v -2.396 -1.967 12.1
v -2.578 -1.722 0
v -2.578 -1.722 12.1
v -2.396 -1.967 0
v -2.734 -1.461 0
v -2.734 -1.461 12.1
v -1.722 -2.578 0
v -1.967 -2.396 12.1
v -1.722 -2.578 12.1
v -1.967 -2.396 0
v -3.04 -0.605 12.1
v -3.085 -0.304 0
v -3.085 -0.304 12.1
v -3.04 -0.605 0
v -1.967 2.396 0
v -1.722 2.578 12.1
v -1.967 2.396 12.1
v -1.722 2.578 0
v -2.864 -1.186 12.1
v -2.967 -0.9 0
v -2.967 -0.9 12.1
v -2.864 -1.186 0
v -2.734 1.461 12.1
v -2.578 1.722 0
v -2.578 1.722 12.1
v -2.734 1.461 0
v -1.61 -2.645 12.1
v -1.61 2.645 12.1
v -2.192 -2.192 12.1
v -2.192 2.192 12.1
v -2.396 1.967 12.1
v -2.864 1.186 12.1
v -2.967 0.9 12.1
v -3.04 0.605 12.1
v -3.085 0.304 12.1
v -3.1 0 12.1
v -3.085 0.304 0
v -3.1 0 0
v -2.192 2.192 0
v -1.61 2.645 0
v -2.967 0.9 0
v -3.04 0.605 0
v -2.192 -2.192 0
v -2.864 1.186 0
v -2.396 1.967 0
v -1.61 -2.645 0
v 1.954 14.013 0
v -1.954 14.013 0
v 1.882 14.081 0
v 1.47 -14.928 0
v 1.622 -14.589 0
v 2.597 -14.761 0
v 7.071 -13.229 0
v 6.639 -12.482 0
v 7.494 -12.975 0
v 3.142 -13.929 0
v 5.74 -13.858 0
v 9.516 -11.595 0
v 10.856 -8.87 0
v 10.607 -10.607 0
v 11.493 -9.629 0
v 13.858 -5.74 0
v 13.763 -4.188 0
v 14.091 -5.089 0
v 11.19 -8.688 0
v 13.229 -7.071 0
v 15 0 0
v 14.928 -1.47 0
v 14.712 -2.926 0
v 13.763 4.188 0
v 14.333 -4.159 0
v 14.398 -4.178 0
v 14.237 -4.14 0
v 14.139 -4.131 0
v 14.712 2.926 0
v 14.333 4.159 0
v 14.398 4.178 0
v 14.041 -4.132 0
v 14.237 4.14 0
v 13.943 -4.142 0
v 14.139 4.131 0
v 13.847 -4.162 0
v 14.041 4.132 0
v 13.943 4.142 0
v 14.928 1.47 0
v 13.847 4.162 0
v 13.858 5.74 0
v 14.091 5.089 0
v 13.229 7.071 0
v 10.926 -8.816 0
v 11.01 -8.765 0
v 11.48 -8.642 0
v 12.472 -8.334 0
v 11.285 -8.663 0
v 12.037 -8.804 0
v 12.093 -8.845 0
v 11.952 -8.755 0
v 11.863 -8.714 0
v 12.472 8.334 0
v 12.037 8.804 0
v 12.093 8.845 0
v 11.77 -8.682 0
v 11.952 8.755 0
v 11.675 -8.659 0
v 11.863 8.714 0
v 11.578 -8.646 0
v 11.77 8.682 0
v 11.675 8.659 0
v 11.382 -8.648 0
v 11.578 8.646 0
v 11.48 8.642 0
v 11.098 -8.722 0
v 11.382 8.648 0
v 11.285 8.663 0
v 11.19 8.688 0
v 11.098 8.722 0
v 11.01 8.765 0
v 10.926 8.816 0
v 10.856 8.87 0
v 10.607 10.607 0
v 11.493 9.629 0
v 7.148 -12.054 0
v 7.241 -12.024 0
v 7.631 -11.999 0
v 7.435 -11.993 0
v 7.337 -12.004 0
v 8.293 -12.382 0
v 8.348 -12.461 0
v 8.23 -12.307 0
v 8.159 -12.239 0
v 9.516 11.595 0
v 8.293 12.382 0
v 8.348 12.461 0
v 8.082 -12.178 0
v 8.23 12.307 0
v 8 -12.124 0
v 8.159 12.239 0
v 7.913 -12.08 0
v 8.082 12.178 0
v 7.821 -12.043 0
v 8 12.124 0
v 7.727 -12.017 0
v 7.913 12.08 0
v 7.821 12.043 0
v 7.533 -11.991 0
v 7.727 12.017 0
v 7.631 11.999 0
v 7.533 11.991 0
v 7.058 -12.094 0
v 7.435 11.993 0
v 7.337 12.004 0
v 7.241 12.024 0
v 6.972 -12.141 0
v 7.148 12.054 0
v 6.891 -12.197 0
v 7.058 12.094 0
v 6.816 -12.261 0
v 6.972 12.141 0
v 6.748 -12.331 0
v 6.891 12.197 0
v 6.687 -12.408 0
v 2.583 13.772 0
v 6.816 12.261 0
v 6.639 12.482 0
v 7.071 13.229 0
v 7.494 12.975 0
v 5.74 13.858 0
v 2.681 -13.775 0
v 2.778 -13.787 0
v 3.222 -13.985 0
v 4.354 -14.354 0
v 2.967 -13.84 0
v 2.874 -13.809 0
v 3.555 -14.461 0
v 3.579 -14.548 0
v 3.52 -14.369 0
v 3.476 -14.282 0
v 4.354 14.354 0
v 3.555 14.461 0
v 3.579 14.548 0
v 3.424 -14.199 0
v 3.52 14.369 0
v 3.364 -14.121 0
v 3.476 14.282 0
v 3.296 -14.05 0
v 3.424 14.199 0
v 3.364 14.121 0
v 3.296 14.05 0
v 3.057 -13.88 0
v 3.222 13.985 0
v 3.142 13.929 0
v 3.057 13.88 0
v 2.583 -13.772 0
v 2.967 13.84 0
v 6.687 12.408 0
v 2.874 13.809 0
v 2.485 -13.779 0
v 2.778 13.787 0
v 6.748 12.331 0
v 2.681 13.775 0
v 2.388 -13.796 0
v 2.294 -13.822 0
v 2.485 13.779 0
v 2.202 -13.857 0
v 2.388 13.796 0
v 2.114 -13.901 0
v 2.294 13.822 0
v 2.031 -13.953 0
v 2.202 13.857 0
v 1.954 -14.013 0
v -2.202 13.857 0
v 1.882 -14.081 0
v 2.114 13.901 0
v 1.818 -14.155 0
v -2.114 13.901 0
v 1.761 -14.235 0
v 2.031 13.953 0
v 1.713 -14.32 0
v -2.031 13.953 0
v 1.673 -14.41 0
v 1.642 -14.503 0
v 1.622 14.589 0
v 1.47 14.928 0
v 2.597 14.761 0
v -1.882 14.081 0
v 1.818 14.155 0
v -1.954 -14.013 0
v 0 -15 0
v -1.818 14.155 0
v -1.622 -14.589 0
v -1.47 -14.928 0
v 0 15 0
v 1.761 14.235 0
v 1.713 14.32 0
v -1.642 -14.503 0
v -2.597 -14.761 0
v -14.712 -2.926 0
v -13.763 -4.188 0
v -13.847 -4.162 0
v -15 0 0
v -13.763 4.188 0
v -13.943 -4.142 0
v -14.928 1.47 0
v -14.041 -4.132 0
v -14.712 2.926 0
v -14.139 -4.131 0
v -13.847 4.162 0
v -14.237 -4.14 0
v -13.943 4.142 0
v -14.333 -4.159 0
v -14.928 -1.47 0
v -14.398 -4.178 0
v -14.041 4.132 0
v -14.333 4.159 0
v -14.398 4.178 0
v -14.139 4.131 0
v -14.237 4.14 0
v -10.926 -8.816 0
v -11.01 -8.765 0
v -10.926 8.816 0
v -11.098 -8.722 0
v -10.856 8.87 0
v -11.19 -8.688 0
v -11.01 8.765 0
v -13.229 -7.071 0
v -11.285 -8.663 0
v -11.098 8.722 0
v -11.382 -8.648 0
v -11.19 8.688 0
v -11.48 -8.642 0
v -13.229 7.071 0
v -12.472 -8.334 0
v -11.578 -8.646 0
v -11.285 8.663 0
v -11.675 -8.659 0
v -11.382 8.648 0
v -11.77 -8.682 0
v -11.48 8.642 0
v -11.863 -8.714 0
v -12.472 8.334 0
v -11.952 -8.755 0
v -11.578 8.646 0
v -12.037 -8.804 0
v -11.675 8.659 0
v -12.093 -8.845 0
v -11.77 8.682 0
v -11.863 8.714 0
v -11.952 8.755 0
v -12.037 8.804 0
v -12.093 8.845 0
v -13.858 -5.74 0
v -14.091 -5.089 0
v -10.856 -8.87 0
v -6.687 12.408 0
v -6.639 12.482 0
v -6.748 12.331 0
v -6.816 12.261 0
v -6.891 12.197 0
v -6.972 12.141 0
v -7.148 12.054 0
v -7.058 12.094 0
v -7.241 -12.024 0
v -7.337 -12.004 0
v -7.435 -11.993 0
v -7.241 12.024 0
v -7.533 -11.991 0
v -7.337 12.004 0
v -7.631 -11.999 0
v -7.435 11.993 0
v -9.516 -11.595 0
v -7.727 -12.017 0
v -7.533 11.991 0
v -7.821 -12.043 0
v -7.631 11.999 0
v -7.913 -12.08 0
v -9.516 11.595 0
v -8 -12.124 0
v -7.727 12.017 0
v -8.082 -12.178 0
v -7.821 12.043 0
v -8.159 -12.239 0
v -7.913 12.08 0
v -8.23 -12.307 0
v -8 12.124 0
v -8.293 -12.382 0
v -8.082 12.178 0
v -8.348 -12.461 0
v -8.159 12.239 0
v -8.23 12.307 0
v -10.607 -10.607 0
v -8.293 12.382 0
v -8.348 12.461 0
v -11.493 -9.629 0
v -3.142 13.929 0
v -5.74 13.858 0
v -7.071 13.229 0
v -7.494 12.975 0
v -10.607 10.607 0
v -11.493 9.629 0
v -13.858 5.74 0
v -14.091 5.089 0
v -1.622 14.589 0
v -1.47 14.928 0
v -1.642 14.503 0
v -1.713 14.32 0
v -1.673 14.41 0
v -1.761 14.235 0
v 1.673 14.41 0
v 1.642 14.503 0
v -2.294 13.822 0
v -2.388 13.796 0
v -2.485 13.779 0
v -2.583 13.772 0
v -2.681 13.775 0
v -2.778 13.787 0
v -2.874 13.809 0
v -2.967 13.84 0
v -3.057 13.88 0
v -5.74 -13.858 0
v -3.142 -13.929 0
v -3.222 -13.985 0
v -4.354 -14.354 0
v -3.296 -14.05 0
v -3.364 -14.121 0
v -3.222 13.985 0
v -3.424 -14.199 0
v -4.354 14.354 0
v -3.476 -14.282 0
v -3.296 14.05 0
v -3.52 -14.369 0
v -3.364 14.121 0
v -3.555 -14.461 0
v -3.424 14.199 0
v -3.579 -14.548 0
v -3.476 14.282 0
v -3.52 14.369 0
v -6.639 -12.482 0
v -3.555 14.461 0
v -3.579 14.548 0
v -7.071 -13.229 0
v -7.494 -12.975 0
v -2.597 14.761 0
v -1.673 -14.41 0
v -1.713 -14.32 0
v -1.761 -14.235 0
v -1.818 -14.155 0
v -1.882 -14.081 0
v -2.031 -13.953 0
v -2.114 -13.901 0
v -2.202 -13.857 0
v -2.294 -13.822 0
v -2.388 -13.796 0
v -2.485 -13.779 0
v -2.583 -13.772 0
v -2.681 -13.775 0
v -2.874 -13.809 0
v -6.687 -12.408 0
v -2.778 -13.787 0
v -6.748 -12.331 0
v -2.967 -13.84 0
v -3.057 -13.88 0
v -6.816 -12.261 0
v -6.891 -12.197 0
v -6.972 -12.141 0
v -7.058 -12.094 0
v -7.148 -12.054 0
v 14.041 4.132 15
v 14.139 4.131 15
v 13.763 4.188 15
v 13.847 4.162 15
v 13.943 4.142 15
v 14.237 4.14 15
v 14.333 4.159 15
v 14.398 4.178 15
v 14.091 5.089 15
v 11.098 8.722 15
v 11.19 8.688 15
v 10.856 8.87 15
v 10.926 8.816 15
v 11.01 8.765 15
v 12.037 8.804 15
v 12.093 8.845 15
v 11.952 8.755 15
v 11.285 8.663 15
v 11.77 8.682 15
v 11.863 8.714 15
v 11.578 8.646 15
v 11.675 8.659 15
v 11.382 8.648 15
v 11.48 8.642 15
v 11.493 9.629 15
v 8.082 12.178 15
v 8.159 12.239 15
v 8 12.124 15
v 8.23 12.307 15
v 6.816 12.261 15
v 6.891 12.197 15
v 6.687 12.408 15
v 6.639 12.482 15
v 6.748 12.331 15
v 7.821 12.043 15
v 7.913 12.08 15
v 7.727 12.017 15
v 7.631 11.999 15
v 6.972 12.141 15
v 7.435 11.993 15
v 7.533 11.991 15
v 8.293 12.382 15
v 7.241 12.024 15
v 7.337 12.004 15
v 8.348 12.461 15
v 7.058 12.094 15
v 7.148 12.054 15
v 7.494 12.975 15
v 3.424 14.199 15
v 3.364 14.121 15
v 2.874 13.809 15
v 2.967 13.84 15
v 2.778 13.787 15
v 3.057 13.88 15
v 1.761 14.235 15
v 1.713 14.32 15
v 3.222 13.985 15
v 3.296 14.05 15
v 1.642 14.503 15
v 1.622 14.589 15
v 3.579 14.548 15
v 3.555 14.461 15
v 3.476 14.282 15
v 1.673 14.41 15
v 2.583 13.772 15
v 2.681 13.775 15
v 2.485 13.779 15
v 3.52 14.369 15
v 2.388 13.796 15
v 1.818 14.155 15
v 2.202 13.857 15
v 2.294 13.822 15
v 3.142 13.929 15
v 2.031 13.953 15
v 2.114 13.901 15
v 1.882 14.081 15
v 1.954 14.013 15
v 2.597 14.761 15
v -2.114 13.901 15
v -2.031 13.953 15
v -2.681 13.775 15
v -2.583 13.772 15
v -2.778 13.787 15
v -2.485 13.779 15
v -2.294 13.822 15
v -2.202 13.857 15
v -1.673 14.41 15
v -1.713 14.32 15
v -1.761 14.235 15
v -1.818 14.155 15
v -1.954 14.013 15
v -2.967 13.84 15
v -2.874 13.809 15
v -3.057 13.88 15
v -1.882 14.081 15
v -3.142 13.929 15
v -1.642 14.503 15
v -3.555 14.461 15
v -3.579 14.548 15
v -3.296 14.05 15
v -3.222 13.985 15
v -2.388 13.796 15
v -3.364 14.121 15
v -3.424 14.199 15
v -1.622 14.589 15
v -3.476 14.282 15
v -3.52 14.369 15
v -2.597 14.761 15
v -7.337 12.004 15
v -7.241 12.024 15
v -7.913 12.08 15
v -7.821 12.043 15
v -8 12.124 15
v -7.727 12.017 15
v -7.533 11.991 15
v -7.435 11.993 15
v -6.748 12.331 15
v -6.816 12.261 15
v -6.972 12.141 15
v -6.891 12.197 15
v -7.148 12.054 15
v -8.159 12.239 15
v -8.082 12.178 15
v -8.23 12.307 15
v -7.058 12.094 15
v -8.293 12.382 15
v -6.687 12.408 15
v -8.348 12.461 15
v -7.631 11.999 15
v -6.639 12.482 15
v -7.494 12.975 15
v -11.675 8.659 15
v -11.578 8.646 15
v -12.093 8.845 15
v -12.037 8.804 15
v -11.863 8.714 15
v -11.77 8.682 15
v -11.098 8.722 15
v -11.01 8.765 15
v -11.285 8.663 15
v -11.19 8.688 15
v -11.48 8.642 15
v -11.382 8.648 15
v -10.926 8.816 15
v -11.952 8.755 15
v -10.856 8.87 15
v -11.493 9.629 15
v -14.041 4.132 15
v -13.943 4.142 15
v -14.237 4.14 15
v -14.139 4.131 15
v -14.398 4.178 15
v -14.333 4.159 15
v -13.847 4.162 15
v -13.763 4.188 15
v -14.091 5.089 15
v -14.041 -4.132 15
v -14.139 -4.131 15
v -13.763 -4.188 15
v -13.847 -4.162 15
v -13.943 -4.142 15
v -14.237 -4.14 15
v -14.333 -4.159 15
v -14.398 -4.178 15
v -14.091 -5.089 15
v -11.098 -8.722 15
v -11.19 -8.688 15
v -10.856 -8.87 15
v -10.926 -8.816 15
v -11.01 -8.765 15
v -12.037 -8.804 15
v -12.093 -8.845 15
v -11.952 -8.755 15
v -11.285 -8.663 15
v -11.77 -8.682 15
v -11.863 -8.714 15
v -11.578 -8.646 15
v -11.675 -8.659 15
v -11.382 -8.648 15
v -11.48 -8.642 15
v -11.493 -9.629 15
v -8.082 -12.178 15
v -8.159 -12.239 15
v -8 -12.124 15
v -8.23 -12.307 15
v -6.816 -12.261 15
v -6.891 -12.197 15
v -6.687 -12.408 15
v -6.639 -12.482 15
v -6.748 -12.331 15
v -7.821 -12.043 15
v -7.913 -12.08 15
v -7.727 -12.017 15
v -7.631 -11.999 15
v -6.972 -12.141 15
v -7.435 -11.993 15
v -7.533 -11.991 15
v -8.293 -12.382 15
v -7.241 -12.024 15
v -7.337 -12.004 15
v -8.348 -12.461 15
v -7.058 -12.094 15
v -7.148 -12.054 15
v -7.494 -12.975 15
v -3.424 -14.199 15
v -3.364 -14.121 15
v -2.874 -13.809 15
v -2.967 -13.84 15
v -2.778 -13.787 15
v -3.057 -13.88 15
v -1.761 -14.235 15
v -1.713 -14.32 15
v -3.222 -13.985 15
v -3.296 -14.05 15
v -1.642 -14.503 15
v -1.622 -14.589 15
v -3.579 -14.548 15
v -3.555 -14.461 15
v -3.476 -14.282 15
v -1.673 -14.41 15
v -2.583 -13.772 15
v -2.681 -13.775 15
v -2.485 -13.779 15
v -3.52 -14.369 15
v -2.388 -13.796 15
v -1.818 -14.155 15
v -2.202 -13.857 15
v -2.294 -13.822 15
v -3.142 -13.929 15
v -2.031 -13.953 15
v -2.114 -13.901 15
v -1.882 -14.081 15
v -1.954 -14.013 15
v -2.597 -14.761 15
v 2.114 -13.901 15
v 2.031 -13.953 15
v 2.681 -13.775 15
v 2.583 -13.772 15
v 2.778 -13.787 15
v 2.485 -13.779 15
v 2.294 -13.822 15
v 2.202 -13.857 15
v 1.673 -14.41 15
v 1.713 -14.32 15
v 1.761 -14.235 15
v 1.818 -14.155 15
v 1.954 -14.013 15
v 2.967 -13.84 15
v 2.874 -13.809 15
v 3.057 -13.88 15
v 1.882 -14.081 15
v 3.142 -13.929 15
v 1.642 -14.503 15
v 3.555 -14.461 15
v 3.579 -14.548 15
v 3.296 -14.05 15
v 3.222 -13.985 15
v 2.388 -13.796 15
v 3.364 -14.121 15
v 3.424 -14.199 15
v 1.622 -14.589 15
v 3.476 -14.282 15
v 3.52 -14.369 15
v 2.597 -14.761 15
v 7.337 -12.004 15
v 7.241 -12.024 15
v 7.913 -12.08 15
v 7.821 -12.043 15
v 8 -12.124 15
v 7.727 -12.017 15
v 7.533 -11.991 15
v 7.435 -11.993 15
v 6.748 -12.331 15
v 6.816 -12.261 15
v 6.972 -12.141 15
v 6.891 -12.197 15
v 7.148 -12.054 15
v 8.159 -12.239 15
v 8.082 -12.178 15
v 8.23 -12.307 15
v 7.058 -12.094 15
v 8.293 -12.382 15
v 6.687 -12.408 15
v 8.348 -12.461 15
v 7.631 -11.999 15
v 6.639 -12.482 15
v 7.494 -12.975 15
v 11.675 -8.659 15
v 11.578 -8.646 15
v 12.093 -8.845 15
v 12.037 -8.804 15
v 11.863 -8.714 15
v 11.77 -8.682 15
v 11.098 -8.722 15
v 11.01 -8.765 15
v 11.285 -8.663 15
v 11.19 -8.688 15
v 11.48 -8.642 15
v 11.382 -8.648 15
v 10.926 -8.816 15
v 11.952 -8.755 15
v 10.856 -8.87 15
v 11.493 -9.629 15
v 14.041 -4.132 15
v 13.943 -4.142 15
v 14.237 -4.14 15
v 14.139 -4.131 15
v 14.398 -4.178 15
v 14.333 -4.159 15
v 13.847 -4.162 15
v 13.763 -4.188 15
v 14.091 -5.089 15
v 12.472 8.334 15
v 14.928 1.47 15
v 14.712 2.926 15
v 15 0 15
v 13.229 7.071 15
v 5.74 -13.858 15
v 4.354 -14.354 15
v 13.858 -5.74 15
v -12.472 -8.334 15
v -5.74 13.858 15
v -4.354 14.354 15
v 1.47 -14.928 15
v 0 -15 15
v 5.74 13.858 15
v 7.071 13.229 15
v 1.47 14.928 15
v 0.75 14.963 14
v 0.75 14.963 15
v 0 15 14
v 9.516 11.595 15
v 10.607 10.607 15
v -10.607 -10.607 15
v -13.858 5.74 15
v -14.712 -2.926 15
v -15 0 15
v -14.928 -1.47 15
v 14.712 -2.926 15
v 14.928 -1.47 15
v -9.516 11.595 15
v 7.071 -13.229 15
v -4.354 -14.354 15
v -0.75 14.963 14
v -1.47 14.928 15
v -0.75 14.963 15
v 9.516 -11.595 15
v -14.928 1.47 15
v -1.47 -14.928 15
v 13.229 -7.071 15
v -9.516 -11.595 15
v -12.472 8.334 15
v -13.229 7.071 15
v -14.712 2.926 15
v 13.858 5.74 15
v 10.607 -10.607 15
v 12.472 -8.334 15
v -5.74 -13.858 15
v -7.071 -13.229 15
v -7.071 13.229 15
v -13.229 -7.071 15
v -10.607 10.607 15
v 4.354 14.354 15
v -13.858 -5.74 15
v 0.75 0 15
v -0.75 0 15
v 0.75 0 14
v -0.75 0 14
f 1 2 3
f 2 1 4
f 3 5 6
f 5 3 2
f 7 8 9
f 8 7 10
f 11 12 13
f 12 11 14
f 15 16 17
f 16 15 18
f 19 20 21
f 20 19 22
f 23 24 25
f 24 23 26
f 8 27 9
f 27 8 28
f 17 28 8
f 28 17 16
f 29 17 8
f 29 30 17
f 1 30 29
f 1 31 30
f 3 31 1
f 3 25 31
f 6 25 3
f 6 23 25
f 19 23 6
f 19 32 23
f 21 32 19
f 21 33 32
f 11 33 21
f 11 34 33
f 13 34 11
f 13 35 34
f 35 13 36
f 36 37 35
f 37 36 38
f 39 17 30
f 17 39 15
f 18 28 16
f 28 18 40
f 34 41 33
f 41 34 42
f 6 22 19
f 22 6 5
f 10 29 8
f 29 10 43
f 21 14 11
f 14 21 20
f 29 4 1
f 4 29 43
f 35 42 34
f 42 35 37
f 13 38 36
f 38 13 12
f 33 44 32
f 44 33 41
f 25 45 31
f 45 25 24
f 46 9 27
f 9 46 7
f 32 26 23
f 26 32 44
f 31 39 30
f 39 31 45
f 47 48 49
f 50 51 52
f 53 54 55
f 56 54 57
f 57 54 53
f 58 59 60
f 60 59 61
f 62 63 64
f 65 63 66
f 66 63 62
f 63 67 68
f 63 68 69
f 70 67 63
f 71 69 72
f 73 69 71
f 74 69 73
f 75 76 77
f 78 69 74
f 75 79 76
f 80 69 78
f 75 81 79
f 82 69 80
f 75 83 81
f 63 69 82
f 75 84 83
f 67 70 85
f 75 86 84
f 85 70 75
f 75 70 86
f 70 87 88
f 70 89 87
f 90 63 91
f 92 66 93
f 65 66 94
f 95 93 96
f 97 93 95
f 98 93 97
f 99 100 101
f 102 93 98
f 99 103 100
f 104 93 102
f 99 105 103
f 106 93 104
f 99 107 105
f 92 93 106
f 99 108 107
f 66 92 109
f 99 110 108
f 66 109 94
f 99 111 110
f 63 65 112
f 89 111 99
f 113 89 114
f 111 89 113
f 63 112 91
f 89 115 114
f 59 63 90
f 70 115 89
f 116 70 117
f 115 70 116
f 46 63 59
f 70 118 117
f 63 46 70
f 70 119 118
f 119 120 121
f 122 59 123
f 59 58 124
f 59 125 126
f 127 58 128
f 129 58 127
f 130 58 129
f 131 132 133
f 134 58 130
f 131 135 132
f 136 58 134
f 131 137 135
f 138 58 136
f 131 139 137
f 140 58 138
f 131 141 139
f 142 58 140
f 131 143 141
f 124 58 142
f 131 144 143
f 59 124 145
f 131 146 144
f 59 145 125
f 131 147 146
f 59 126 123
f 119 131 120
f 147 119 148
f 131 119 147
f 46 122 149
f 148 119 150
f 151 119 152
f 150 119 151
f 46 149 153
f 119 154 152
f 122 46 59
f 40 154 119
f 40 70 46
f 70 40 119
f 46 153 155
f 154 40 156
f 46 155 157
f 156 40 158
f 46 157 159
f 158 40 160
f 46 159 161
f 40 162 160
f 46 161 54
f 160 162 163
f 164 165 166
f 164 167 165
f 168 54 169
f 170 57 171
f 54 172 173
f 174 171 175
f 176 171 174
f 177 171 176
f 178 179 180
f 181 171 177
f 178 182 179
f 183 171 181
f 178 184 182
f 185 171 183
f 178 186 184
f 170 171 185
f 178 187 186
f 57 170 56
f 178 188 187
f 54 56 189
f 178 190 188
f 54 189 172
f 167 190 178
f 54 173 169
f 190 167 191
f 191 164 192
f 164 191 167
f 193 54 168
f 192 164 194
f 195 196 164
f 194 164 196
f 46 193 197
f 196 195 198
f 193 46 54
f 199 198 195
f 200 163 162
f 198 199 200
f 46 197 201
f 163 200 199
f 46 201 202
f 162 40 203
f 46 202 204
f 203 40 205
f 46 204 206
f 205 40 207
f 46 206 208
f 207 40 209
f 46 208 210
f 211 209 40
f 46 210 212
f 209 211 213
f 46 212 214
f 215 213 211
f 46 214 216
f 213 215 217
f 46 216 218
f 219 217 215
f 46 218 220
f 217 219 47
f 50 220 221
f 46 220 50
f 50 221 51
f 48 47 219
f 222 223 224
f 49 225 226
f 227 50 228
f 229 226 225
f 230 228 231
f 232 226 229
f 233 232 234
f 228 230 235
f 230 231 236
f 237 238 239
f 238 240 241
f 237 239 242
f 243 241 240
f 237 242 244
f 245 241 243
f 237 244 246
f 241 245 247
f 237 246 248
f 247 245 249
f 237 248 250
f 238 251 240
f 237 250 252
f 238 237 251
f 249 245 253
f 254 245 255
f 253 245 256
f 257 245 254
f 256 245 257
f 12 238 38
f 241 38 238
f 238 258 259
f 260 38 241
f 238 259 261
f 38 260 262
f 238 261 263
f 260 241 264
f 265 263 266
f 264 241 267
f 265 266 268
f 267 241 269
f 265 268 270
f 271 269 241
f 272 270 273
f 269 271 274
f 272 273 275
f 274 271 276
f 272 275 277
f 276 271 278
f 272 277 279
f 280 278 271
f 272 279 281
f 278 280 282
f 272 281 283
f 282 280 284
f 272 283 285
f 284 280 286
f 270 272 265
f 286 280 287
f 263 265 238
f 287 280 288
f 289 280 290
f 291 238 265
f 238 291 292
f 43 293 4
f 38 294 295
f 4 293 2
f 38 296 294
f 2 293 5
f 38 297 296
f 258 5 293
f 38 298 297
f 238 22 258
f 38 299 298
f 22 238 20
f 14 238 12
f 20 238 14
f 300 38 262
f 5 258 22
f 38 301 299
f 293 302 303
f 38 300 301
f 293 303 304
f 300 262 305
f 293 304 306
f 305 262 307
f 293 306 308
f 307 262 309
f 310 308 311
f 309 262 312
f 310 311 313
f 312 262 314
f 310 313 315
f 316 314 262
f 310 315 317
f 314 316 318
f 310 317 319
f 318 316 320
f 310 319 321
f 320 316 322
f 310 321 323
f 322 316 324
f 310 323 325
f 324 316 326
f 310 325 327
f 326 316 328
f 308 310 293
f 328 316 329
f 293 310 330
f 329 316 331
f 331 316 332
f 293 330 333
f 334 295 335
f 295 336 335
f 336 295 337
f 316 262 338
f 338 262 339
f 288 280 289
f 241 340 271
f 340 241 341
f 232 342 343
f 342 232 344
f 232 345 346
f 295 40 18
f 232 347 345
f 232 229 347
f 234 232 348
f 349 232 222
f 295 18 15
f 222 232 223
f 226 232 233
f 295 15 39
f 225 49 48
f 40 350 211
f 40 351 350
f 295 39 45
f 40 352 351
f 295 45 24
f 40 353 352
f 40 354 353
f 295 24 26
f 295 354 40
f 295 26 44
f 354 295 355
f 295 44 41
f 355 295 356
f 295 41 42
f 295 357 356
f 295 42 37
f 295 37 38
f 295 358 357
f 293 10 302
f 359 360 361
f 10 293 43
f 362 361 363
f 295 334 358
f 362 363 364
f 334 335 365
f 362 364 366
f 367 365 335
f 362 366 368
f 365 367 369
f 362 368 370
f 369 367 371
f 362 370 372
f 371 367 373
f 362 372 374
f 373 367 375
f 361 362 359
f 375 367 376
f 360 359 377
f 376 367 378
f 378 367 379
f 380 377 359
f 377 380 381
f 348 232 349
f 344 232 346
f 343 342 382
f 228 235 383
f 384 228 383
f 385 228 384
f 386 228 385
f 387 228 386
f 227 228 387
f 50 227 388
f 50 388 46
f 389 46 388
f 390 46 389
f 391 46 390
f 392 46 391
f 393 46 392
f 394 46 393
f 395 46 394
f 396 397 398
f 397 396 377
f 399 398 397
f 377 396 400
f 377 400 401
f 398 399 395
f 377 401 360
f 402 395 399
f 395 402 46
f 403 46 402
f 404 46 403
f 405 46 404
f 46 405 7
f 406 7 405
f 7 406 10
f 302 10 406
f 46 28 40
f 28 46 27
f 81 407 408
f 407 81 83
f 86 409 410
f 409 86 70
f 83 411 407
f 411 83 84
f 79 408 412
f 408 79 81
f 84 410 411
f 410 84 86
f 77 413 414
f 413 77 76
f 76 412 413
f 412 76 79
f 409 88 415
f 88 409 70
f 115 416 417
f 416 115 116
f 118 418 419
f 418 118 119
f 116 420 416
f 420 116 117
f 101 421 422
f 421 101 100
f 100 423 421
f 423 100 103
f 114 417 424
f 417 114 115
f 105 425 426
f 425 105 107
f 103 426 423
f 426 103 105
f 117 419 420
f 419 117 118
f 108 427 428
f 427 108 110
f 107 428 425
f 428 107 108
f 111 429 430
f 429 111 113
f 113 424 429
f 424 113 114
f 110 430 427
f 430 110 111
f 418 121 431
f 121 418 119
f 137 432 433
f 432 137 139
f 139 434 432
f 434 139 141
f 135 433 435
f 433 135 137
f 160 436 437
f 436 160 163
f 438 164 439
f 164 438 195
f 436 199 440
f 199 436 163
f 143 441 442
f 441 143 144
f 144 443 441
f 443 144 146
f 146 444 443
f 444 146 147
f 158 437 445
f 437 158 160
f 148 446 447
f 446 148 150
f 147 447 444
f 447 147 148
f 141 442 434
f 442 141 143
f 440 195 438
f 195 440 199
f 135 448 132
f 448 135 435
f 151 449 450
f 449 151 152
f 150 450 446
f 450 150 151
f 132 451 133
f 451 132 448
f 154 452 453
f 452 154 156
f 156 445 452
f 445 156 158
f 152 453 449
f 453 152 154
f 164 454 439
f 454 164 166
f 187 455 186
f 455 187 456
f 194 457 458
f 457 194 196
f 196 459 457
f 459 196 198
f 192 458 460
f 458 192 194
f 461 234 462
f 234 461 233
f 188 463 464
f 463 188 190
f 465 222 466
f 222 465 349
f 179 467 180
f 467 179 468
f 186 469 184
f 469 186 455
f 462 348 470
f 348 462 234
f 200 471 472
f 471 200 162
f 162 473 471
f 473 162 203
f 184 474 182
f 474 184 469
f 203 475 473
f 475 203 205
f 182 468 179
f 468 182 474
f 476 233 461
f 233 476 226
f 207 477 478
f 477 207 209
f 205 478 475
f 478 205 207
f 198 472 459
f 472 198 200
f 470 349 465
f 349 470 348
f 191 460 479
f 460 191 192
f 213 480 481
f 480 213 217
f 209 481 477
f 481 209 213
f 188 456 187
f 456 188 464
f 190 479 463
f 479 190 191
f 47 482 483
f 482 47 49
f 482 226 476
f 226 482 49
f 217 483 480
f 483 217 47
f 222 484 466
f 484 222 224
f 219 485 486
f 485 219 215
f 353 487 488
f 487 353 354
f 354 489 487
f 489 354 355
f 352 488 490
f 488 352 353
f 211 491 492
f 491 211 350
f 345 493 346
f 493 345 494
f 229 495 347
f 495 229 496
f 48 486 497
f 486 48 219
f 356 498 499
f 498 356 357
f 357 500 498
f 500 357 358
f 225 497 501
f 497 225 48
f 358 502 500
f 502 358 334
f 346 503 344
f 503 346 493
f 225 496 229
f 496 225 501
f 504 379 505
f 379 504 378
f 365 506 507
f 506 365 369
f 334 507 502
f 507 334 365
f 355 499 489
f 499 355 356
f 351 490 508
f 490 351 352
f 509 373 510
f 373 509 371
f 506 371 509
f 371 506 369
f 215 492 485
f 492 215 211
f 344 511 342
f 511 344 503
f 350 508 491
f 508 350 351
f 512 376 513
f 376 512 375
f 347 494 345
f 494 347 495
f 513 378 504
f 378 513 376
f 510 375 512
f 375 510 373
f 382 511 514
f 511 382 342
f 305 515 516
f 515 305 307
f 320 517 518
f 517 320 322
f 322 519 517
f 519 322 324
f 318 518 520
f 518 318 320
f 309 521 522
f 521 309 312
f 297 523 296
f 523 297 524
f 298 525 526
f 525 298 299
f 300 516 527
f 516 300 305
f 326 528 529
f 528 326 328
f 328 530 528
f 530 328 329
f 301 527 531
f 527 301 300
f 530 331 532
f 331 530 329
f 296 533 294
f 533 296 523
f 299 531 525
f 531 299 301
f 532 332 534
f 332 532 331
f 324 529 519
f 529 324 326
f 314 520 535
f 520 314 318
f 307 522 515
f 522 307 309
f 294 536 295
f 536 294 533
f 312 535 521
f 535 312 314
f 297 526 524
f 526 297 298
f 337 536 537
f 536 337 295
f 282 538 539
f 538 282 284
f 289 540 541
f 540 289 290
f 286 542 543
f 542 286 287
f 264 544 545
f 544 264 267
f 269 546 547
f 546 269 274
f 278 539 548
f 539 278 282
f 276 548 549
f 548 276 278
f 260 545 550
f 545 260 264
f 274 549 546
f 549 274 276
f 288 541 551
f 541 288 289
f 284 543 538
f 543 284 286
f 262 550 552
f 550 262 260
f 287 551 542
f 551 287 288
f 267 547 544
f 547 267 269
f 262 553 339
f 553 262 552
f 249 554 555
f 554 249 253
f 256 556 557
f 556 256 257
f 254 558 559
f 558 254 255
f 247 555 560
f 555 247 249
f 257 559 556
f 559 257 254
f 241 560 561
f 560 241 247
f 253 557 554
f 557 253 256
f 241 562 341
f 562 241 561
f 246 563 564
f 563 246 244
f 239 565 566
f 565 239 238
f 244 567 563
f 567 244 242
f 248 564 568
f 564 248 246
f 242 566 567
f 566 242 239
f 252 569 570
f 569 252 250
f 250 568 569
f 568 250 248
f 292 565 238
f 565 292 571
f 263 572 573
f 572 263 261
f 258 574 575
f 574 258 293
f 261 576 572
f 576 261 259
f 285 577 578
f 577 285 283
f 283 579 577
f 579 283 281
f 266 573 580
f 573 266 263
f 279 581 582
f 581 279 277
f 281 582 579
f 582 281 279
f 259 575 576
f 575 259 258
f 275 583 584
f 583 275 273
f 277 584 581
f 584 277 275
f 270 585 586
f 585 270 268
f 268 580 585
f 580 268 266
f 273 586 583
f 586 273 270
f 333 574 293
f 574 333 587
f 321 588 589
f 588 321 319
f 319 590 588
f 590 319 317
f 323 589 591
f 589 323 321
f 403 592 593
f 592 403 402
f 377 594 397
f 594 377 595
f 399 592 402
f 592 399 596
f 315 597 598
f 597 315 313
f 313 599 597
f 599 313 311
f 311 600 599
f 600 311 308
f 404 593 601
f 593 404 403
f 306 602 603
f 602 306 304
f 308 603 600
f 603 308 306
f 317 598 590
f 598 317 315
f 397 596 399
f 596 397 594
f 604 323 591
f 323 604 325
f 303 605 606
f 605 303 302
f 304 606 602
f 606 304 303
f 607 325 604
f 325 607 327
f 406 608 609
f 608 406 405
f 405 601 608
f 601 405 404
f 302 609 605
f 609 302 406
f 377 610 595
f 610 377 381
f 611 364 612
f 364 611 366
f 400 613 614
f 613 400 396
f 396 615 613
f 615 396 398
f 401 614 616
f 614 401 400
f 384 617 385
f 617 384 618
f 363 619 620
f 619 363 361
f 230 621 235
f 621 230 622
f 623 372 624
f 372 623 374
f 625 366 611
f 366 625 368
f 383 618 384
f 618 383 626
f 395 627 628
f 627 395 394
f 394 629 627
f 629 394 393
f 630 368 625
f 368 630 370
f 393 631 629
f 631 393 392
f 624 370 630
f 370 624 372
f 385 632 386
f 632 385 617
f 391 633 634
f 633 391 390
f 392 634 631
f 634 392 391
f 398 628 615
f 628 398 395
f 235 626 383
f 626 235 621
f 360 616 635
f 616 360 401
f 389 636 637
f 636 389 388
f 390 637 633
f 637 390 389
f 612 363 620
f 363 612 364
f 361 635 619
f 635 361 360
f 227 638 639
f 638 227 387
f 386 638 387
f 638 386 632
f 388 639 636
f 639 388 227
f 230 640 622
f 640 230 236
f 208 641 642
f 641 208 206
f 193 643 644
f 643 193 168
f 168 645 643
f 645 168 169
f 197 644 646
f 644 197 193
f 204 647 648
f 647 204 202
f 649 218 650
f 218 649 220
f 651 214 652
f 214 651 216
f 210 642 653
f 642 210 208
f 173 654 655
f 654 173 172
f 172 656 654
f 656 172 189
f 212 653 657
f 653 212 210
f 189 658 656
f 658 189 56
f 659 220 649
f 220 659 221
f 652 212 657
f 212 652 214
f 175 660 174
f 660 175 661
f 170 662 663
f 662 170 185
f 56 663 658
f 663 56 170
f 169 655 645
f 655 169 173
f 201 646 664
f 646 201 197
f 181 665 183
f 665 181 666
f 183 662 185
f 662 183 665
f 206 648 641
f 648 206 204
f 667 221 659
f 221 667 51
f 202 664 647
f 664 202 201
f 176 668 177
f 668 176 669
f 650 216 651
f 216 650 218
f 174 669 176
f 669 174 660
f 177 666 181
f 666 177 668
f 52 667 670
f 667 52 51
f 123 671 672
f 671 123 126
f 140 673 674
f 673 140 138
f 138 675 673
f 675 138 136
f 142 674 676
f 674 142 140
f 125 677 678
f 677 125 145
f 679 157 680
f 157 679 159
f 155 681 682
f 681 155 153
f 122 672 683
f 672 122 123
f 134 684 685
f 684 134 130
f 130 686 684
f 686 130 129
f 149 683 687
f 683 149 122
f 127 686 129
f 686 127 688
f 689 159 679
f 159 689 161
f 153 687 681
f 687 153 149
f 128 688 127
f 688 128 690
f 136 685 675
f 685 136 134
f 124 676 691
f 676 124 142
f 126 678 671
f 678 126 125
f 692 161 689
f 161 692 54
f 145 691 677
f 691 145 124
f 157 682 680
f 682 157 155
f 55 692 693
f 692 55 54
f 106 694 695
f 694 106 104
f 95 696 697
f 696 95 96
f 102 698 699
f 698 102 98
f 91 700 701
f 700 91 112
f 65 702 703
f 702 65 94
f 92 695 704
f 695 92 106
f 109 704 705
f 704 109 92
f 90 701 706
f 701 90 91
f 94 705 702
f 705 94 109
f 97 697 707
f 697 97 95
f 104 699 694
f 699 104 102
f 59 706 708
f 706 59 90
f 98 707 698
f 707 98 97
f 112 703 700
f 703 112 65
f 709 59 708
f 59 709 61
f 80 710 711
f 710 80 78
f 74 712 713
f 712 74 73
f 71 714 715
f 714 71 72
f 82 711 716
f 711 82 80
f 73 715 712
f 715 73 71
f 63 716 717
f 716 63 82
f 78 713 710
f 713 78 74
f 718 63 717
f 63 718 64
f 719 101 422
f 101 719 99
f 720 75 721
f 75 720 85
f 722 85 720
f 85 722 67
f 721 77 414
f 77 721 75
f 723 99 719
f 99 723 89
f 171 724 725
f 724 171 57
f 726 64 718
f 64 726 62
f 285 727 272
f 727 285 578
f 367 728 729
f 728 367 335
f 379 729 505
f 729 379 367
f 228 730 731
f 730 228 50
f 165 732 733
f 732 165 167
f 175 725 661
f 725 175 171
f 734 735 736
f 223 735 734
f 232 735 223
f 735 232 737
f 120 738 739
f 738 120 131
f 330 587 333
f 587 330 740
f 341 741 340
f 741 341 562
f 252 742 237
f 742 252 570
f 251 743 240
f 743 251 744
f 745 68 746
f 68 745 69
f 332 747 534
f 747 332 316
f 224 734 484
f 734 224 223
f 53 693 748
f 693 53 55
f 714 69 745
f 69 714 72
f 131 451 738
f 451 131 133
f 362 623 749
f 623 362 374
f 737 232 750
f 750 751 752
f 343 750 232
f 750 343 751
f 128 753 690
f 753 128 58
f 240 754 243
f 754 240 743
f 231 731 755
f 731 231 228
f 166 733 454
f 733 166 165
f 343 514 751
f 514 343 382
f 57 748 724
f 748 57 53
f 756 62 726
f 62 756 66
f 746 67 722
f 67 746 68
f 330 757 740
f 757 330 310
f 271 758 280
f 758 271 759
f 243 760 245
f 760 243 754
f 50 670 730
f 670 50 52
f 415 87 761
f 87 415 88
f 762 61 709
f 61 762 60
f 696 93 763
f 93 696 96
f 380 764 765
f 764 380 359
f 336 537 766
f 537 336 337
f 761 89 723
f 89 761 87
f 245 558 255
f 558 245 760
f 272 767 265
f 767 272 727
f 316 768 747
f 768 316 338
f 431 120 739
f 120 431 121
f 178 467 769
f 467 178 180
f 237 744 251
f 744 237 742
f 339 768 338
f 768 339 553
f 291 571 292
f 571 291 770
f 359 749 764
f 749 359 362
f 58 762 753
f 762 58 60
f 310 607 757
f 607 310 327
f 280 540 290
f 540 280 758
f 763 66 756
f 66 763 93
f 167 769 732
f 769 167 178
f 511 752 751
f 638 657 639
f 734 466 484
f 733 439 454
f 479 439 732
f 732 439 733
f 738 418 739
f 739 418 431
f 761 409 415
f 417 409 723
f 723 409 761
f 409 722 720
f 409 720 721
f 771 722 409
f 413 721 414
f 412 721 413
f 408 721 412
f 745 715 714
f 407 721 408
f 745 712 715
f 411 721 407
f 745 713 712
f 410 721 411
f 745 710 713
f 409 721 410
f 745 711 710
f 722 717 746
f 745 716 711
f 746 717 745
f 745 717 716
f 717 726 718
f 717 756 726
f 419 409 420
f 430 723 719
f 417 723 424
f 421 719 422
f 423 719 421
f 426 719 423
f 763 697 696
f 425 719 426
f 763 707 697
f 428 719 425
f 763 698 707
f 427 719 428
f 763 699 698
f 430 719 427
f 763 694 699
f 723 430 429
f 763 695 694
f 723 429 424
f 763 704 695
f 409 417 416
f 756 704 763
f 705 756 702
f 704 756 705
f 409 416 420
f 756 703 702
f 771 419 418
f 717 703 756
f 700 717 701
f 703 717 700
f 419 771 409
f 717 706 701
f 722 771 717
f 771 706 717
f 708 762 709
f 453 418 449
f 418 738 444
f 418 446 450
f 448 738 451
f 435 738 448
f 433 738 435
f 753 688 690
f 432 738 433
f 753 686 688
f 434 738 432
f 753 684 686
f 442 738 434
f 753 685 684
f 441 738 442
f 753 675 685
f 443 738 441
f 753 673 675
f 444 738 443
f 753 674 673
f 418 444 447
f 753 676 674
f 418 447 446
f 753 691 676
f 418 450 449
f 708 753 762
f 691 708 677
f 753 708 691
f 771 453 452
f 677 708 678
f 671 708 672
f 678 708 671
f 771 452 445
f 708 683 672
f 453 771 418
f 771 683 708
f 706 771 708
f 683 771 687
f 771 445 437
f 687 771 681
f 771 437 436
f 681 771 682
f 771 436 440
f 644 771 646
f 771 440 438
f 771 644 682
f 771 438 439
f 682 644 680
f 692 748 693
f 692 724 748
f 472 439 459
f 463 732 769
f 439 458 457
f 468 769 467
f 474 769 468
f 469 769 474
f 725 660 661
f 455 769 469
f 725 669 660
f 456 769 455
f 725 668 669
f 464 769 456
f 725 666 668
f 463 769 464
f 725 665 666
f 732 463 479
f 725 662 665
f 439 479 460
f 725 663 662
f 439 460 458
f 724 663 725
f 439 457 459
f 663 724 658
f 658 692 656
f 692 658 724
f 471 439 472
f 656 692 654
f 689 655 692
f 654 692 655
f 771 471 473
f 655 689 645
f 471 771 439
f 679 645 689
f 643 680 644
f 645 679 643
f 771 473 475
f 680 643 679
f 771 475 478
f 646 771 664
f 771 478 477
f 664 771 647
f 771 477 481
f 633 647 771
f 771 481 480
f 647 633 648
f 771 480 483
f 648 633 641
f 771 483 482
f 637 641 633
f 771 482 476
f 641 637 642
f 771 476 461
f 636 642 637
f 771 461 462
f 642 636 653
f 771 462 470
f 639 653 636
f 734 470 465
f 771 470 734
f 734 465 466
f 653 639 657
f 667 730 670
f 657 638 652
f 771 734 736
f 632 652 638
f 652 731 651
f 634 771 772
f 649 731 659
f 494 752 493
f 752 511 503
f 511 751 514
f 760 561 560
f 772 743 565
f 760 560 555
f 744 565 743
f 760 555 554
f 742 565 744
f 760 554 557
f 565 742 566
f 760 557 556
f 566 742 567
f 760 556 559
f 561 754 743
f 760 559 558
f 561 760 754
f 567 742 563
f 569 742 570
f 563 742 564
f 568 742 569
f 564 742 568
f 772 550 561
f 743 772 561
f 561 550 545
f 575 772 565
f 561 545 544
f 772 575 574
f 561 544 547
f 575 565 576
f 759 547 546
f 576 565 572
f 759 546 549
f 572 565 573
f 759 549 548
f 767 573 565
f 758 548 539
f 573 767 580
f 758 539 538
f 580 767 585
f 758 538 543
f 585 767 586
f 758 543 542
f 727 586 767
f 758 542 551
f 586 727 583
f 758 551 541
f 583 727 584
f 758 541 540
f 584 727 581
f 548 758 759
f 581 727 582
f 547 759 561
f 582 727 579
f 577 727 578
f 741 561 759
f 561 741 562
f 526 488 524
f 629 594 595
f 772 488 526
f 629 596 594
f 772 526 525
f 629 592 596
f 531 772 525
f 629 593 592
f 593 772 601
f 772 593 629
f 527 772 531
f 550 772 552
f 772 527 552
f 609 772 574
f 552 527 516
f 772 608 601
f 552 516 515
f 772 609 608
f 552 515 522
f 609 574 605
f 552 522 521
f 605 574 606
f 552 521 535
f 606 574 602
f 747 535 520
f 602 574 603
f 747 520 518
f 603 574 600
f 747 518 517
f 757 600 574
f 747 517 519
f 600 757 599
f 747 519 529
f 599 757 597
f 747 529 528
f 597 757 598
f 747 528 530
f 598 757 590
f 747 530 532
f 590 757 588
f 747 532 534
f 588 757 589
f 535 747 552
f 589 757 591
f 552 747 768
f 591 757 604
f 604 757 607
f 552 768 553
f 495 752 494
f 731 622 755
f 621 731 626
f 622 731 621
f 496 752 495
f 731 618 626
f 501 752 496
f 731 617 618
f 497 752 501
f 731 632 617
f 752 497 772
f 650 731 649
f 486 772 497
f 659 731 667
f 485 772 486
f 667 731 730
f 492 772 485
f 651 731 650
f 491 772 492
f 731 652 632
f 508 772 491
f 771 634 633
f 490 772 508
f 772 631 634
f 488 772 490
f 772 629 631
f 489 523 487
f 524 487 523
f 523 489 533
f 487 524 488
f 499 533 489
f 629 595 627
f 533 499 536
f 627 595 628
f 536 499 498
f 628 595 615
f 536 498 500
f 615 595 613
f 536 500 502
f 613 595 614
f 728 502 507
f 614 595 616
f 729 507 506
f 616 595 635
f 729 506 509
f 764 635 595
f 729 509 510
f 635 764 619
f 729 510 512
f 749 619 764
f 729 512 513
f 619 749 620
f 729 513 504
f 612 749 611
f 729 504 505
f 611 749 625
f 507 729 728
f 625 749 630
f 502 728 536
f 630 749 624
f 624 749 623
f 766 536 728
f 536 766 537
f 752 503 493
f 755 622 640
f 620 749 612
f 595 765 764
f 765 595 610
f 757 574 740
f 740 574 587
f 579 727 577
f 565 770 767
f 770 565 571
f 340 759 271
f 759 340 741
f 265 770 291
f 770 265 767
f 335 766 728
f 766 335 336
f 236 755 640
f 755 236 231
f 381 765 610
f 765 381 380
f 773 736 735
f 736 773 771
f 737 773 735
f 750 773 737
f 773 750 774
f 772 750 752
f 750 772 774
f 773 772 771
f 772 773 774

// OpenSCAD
// Replacement knob for hotplate stirrer with 6 mm D-shaft
// Dimensions measured with calipers

// Knob body dimensions
knob_diameter = 30;
knob_radius = knob_diameter / 2;
knob_height = 15;

// D-shaft blind bore dimensions
bore_diameter = 6.2;
bore_radius = bore_diameter / 2;
bore_depth = 12;
// Distance from flat to opposite side of circle is 4.7 mm
// This means the flat is offset from center by: bore_radius - 4.7 = 3.1 - 4.7 = -1.6 mm
// So the flat is 1.6 mm on the opposite side of center from the "point" of the D
d_flat_offset = bore_radius - 4.7; // = -1.6 mm

// Grip groove dimensions
num_grooves = 18;
groove_diameter = 2;
groove_radius = groove_diameter / 2;

// Pointer groove dimensions
pointer_width = 1.5;
pointer_depth = 1;

// Print quality
$fn = 64;

// Main knob body
difference() {
    // Solid cylinder
    cylinder(h = knob_height, r = knob_radius, center = false);
    
    // D-shaped blind bore (centered on Z axis, extending from z=0 up to bore_depth)
    // The D-shape: a circle with one side cut flat
    // The flat is at distance d_flat_offset from center (negative means flat is on the -X side)
    // We create the D-shape by subtracting a half-space from a cylinder
    translate([0, 0, 0]) {
        difference() {
            // Cylindrical bore
            cylinder(h = bore_depth + 0.1, r = bore_radius, center = false);
            
            // Cut the flat side: remove material where x < d_flat_offset
            // This creates a flat surface at x = d_flat_offset
            // We use a large box that extends past the bore
            translate([d_flat_offset - 0.01, -knob_radius - 1, -0.1]) {
                cube([knob_radius + 1, 2 * knob_radius + 2, bore_depth + 0.3]);
            }
        }
    }
    
    // 18 evenly spaced vertical grip grooves along the outer surface
    for (i = [0 : num_grooves - 1]) {
        angle = i * 360 / num_grooves;
        // Position the groove center on the outer surface
        translate([knob_radius * cos(angle), knob_radius * sin(angle), 0]) {
            // Rotate so the half-cylinder faces inward
            rotate([0, 0, -angle]) {
                // Half-cylinder groove: cut into the knob from the outside
                // The groove is a half-cylinder of diameter 2 mm, centered on the surface
                // So it extends groove_radius inward and groove_radius outward (but outward is outside the knob)
                translate([0, 0, 0]) {
                    difference() {
                        cylinder(h = knob_height + 0.1, r = groove_radius, center = false);
                        // Remove the outer half (outside the knob) - not strictly necessary but clean
                        translate([-groove_radius - 0.01, -groove_radius - 0.01, -0.1]) {
                            cube([groove_radius + 0.02, 2 * groove_radius + 0.02, knob_height + 0.3]);
                        }
                    }
                }
            }
        }
    }
    
    // Pointer groove on top face: 1.5 mm wide, 1 mm deep, from center to outer edge
    // On the same side as the flat of the D (the flat is at x = d_flat_offset = -1.6 mm, so negative X side)
    // The groove runs from center (0,0) to outer edge in the -X direction
    translate([-pointer_width/2, 0, knob_height - pointer_depth]) {
        cube([pointer_width, knob_radius, pointer_depth + 0.1]);
    }
}
